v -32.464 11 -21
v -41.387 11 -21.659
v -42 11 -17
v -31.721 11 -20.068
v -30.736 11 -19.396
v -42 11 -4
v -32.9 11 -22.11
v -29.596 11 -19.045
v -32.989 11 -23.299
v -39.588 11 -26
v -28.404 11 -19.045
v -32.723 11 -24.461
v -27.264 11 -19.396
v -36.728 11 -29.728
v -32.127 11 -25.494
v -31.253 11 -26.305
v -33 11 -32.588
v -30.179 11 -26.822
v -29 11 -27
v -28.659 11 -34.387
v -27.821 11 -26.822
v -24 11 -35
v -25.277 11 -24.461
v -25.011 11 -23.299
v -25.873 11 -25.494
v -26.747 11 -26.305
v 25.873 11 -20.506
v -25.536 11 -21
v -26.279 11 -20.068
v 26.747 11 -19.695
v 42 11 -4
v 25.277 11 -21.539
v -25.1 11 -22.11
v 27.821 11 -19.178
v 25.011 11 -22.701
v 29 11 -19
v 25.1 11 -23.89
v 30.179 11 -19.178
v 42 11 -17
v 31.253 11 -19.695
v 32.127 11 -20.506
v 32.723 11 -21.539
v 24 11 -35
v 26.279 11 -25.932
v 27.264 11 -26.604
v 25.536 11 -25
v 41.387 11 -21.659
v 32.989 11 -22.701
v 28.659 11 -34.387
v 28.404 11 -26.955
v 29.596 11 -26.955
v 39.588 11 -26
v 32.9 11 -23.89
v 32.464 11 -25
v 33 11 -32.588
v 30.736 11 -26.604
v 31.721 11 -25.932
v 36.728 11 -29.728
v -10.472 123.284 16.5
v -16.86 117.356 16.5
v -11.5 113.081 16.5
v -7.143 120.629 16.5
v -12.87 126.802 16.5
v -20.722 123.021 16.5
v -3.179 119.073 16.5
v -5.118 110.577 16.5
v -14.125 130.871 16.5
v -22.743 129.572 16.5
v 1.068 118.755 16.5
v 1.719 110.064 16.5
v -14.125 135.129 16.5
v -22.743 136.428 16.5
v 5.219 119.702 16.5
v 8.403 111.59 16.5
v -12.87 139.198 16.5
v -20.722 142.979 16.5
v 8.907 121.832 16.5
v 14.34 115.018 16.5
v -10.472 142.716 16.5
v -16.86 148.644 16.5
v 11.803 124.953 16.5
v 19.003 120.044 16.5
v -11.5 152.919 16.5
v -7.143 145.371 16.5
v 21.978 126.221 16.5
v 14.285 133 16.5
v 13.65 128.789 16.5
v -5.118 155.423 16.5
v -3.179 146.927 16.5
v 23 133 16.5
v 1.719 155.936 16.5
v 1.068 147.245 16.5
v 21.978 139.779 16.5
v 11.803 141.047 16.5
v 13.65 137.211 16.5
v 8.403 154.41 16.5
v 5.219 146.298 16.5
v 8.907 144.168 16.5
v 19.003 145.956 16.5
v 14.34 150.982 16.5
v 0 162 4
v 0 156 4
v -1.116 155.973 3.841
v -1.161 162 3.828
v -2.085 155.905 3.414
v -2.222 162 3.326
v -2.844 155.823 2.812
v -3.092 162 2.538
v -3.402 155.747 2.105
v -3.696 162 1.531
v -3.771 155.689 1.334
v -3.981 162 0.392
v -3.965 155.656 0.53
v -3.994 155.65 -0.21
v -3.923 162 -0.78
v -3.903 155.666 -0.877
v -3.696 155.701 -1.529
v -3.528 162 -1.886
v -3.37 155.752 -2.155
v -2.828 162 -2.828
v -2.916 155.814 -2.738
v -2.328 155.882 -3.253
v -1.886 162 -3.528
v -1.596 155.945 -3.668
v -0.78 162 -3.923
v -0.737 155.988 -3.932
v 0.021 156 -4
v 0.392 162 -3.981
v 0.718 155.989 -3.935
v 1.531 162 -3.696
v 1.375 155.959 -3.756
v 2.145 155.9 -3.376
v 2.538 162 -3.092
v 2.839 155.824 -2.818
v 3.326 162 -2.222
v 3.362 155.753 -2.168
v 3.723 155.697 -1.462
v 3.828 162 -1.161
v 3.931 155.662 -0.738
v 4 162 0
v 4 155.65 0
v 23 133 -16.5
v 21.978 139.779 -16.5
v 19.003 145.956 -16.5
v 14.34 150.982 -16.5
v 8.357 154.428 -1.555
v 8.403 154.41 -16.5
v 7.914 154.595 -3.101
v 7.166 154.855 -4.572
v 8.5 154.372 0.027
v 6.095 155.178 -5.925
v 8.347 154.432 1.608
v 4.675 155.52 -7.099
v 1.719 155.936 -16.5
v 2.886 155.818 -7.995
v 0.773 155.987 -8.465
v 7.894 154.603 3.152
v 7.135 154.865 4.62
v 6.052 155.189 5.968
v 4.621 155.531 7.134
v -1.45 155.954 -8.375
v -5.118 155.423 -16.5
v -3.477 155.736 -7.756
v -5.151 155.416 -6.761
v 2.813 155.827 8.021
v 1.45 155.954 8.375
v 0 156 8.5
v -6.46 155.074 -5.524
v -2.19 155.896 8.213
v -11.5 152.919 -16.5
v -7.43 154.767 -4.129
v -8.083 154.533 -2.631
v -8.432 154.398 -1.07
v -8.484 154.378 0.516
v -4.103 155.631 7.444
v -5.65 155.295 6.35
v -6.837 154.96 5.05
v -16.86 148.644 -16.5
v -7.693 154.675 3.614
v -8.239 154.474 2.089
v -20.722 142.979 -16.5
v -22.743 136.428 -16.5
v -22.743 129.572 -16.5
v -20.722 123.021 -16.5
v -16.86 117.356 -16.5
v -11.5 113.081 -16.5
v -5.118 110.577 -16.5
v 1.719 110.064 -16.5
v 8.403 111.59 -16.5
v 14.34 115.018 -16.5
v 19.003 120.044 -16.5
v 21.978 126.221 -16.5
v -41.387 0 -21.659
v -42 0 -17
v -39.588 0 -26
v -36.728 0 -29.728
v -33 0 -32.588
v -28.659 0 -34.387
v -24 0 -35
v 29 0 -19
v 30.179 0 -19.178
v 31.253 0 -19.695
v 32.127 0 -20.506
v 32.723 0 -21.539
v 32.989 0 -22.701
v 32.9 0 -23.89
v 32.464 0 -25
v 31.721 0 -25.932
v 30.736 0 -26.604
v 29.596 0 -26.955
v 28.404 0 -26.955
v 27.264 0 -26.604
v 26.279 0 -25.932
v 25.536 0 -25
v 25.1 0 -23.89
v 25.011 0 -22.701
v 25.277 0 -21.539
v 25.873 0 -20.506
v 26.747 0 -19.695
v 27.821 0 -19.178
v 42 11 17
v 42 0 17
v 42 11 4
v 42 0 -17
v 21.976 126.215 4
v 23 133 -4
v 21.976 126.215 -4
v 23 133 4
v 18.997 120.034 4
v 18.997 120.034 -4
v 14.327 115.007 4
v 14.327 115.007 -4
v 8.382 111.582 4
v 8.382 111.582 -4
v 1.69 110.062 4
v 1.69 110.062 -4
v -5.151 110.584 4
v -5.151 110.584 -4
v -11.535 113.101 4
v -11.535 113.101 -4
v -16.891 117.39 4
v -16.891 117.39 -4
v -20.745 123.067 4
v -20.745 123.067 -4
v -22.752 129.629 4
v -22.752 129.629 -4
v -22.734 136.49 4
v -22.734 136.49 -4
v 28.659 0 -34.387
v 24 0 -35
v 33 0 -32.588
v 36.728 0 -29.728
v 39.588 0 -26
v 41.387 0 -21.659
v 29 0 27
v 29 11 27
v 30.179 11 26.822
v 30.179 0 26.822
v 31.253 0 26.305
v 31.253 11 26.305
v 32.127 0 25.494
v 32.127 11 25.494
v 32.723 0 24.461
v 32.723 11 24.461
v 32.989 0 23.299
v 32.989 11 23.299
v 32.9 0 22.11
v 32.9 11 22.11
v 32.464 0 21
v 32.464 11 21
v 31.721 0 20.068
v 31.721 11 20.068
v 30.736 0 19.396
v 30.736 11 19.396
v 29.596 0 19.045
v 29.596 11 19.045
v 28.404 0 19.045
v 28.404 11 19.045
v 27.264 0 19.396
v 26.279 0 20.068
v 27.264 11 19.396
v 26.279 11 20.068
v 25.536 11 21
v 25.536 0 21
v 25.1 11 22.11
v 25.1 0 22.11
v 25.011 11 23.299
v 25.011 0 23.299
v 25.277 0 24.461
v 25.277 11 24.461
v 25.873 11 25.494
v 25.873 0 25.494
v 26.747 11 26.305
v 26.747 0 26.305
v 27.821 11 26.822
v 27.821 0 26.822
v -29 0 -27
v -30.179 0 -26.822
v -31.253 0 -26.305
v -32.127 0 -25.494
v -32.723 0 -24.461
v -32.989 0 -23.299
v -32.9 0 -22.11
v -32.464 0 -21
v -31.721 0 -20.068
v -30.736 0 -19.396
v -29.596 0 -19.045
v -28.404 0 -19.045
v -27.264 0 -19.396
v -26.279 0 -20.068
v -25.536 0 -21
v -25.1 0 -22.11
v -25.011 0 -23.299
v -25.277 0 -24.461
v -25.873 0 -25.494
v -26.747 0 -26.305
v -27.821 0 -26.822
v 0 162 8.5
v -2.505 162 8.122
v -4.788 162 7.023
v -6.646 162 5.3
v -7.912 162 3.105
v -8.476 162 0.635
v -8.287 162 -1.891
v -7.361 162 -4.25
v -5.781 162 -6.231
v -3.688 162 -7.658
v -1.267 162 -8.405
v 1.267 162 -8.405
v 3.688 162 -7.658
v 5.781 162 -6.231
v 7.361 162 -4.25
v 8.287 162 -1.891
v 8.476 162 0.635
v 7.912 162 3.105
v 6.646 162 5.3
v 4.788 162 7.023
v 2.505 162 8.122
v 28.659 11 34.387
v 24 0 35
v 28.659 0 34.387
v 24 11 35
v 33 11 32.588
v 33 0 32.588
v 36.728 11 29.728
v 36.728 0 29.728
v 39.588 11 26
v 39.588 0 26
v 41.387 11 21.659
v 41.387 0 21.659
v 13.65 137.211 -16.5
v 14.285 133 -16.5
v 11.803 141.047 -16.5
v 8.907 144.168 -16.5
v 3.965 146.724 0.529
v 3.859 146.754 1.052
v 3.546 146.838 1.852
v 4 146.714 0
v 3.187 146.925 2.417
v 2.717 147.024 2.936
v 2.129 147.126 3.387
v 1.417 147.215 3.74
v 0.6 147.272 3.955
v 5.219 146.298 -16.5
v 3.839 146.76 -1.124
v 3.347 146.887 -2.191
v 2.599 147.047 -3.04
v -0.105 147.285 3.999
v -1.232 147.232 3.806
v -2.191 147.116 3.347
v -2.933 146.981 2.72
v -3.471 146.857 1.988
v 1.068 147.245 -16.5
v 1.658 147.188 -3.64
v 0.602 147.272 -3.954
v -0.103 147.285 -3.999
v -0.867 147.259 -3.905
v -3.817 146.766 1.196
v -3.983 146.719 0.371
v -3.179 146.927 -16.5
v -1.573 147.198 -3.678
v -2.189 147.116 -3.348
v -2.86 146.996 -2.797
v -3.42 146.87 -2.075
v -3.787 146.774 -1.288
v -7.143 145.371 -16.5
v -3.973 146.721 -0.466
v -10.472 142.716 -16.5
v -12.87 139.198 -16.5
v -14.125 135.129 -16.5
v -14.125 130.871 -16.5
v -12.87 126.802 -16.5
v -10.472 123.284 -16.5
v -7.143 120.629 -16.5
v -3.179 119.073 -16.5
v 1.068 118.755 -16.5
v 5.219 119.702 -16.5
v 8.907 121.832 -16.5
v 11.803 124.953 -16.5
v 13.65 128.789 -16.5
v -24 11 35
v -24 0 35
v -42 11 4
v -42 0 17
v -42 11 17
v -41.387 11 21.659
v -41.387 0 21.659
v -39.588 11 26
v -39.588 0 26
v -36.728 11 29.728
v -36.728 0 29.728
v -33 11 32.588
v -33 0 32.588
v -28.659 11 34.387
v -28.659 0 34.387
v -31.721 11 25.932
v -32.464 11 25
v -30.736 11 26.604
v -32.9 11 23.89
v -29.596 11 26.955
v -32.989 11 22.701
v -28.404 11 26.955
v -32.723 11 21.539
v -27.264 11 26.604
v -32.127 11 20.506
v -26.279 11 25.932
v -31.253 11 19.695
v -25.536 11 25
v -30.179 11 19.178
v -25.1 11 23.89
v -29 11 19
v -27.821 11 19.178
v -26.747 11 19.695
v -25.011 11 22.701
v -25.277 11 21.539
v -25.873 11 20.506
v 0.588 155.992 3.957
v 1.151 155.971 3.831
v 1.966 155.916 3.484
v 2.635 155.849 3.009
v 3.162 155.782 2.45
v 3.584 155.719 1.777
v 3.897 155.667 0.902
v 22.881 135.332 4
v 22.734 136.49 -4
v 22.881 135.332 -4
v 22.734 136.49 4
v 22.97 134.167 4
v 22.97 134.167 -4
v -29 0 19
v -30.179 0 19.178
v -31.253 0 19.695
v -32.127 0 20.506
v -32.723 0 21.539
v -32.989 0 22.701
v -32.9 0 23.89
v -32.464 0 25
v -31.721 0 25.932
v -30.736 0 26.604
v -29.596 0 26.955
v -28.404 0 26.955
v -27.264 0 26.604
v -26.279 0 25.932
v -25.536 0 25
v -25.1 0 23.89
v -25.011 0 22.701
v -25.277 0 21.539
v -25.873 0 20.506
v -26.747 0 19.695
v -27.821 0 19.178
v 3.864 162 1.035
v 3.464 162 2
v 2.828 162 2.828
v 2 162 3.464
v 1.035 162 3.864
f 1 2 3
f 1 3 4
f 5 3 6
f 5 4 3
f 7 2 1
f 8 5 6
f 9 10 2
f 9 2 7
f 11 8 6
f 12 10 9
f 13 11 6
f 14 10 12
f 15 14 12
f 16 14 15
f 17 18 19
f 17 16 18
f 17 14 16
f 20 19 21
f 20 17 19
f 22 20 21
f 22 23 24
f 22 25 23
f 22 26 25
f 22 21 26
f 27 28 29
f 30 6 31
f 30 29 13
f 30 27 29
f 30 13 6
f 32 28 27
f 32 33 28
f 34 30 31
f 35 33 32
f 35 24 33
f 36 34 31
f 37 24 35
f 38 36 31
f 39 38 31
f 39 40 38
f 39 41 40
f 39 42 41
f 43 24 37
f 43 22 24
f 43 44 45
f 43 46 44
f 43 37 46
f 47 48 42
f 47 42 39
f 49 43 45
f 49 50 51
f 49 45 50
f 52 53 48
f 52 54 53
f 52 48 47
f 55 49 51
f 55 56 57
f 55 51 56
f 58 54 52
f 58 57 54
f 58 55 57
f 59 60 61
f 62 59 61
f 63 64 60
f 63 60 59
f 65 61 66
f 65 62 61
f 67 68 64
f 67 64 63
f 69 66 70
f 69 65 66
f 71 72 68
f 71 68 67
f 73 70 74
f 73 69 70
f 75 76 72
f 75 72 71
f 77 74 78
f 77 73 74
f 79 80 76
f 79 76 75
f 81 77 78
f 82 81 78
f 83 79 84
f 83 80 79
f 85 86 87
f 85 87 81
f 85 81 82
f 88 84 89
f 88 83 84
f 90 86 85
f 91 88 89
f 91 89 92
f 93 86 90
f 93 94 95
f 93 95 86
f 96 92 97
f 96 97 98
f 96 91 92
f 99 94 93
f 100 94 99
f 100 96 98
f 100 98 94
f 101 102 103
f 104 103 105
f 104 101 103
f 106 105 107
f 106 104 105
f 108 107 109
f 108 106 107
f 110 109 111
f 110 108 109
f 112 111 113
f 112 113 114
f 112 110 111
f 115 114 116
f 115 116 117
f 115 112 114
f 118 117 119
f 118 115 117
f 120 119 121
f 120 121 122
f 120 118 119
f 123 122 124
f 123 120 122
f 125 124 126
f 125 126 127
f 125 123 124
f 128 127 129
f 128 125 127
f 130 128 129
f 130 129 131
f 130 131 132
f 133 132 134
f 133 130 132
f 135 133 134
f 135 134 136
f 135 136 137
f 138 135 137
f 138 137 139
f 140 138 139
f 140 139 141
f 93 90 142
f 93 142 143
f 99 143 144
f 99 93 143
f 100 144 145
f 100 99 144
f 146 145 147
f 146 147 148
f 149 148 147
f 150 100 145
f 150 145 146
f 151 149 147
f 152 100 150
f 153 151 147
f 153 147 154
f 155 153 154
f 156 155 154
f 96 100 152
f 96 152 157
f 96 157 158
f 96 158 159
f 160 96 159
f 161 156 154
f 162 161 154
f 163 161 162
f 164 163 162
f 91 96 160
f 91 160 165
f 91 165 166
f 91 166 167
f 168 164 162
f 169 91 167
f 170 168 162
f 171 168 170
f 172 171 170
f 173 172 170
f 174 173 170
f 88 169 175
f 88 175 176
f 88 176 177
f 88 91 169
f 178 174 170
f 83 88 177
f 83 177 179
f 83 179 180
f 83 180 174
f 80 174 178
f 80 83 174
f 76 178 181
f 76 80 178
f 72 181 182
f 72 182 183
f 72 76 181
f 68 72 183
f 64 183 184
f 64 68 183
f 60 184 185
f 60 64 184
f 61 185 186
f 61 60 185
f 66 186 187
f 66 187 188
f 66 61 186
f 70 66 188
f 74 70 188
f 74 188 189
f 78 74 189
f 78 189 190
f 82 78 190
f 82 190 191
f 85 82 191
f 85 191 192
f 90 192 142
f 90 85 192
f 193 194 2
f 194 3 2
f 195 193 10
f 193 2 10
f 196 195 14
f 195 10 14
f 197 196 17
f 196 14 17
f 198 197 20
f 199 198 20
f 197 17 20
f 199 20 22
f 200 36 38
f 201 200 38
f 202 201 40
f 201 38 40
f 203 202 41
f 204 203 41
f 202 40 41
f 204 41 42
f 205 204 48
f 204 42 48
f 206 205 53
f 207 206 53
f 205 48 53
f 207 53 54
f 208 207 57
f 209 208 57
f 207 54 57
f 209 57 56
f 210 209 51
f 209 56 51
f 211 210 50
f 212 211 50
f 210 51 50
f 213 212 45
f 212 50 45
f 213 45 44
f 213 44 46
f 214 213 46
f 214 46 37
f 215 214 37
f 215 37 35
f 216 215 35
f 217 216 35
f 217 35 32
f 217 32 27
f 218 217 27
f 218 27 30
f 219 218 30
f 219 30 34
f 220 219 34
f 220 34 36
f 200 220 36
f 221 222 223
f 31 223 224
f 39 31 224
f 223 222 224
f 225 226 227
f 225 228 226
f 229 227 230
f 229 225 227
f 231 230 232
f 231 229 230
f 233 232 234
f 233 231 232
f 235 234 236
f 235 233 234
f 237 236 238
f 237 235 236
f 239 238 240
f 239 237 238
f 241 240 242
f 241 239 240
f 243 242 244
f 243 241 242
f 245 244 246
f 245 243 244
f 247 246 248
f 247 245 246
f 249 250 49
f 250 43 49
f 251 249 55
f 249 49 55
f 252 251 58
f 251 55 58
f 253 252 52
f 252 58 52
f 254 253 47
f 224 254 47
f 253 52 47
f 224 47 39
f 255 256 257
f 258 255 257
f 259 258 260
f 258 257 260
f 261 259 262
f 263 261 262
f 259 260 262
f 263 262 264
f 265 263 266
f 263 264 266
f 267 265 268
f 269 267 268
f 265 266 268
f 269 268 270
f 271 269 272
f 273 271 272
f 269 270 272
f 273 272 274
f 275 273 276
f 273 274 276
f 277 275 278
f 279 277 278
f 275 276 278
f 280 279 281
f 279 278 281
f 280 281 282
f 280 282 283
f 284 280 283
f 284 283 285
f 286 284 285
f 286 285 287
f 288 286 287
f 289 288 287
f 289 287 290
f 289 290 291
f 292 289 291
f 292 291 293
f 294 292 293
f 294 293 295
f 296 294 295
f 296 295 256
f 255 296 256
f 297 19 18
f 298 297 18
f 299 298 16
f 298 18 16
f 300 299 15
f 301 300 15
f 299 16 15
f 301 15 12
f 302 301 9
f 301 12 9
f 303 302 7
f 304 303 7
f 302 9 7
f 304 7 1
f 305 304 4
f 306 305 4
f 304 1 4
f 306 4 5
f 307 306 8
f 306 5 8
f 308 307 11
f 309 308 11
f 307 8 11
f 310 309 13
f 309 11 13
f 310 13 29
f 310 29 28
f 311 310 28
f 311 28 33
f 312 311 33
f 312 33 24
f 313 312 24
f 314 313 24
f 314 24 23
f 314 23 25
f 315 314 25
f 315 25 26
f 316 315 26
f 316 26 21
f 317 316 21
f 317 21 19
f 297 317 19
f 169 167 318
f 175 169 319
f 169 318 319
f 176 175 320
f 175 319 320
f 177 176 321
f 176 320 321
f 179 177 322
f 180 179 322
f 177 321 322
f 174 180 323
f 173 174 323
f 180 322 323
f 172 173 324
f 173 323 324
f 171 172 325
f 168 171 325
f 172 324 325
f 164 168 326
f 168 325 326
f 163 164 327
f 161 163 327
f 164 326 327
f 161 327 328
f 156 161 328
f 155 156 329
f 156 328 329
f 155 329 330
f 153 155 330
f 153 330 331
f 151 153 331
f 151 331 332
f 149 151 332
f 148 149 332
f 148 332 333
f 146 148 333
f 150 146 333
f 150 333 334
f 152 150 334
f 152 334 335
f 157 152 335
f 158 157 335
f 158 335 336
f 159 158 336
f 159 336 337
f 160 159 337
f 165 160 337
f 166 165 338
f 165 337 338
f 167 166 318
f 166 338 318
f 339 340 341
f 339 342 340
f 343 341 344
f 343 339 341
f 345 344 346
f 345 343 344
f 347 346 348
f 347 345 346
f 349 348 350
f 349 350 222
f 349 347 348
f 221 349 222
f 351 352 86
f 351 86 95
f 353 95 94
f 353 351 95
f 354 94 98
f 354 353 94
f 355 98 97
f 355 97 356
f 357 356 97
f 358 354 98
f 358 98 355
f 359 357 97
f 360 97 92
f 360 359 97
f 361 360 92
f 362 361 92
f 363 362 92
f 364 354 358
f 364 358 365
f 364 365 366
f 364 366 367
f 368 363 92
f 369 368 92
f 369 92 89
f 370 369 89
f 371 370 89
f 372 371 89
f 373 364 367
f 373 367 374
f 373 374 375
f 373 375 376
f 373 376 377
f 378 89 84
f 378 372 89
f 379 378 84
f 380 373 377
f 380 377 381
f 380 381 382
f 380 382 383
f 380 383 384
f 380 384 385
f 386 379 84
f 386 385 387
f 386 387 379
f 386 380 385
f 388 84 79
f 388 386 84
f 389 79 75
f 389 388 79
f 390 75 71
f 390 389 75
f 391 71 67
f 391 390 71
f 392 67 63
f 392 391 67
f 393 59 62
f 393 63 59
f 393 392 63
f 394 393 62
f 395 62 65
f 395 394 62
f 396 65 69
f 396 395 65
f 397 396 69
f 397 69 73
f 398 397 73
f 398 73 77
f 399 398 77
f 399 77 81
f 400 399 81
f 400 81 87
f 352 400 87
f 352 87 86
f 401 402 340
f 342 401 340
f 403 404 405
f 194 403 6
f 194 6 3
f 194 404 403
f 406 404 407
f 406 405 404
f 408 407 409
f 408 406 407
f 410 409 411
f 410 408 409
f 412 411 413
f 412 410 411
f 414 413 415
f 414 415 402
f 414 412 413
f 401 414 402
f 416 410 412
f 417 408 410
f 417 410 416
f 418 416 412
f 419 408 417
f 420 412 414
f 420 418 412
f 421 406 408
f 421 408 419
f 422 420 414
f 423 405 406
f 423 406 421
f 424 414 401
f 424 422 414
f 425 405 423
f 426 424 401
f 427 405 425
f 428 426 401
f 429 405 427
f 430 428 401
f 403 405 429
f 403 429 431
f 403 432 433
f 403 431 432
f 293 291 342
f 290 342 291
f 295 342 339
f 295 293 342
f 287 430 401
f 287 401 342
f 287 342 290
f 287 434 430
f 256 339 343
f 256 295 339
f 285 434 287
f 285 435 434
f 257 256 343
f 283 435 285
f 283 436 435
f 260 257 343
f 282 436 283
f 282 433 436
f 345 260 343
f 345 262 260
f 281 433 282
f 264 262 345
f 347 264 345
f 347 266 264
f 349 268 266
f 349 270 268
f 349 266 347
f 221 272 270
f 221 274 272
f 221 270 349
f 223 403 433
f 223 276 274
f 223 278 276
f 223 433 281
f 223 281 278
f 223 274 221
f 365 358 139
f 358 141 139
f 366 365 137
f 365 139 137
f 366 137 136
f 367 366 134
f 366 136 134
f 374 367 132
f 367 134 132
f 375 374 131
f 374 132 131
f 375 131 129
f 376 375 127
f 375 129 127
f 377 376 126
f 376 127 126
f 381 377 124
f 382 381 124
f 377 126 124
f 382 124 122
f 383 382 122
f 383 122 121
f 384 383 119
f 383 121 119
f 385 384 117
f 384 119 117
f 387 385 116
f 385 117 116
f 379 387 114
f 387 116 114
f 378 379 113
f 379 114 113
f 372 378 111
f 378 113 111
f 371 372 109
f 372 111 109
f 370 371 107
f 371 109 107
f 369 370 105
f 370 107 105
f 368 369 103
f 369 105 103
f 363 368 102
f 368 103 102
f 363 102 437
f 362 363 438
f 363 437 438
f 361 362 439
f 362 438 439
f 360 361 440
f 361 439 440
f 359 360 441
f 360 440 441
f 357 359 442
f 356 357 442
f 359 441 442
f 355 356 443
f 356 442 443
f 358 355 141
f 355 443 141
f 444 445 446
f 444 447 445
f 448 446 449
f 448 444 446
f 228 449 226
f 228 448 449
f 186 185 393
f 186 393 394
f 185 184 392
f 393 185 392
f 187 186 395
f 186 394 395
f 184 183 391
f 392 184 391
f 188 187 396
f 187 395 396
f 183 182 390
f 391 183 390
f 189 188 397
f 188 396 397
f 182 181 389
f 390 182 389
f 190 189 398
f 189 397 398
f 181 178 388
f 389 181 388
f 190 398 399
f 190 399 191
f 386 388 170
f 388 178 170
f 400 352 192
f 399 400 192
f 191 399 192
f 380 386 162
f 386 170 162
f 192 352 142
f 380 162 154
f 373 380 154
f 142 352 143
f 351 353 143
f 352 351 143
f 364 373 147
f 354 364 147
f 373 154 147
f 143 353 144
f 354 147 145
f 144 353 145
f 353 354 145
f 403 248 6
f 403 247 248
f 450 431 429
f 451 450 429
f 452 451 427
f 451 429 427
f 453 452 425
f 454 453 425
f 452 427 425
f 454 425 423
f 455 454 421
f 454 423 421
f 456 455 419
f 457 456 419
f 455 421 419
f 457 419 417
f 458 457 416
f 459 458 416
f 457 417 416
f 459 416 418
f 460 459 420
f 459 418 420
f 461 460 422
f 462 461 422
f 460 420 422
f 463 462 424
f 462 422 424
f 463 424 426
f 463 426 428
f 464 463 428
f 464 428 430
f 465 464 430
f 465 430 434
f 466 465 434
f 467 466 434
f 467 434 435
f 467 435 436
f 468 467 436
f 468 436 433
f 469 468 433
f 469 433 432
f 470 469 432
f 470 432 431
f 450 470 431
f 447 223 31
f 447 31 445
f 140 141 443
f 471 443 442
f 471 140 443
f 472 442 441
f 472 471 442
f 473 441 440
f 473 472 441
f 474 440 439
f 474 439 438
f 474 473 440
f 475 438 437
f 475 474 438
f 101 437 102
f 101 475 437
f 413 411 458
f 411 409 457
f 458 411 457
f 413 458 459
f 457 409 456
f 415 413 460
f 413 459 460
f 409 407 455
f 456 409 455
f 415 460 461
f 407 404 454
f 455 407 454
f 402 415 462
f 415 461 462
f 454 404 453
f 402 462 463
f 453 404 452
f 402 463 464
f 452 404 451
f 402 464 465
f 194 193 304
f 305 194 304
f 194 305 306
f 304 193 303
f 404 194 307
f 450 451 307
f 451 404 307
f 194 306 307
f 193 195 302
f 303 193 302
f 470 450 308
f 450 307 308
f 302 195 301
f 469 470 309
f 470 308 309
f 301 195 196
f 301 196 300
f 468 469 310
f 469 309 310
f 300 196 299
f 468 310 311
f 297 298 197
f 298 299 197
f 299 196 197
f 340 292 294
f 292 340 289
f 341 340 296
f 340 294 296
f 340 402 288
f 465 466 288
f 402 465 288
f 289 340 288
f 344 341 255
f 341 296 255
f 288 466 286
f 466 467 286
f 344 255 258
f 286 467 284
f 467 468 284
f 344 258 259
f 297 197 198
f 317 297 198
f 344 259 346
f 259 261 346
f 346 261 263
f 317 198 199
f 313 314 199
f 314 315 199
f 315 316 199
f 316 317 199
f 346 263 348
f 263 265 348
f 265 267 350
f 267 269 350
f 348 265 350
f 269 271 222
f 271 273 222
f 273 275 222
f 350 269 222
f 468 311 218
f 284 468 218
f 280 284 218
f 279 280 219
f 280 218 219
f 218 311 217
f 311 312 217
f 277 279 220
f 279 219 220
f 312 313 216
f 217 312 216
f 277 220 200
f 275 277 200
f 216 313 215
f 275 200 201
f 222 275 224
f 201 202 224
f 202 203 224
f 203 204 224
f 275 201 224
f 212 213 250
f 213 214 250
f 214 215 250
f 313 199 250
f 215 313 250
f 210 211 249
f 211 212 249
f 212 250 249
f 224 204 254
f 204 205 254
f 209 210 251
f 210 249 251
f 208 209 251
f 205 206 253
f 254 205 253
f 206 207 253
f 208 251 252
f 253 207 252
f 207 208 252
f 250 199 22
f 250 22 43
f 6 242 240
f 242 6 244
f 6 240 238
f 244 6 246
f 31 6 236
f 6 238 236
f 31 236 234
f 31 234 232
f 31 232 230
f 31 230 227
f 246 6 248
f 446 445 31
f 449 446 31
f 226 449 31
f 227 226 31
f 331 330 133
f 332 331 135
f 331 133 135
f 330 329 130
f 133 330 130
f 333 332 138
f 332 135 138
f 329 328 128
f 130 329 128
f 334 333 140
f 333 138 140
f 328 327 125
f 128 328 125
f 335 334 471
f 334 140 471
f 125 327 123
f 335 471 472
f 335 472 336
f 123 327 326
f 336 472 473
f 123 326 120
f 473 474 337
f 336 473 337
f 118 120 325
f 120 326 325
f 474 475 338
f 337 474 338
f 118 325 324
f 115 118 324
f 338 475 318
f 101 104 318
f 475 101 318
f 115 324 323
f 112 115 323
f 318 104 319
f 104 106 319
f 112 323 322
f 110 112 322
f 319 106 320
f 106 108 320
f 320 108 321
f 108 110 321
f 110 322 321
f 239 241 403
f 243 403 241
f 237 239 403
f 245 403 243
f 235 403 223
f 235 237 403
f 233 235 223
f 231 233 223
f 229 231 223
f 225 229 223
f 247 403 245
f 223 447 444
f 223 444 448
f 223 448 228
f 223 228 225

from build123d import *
from build123d.topology import SkipClean

# Parameters (mm, degrees)
SKETCH1_W                = 84
SKETCH1_H                = 70
BOSS_EXTRUDE1_DEPTH      = 11
SKETCH2_R                = 4
CUT_EXTRUDE1_DEPTH       = 56.767373974
FILLET1_R                = 18
BOSS_EXTRUDE2_DEPTH      = 4
SKETCH3_3_R              = 23
SKETCH3_3_R_2            = 14.285
BOSS_EXTRUDE3_DEPTH      = 16.5
CUT_EXTRUDE2_DEPTH       = 166.302752548
CUT_EXTRUDE2_DEPTH_BACK  = 166.302752548
SKETCH3_4_R              = 14.285
BOSS_EXTRUDE4_REACH      = 172.977
BOSS_EXTRUDE4_END_RADIUS = 23
SKETCH5_R                = 8.5
SKETCH5_R_2              = 4
CUT_EXTRUDE4_OUTLINE_W   = 4
CUT_EXTRUDE4_OUTLINE_H   = 15.28653943


# Read off the part's stored shape, not the designer's step: Cut-Extrude4
with BuildPart() as part:
    # Sketch1 → Boss-Extrude1 (new body)
    with BuildSketch(Plane(origin=(0, 0, 0), x_dir=(1, 0, 0), z_dir=(0, 1, 0))):
        Rectangle(SKETCH1_W, SKETCH1_H)
    extrude(amount=BOSS_EXTRUDE1_DEPTH)

    # Sketch2 → Cut-Extrude1 (cut, through all)
    with BuildSketch(Plane(origin=(0, 11, 0), x_dir=(1, 0, 0), z_dir=(0, 1, 0))):
        with Locations(Location((29, 23, 0), (0, 0, 270))):
            Circle(SKETCH2_R)
        with Locations(Location((29, -23, 0), (0, 0, 270))):
            Circle(SKETCH2_R)
        with Locations(Location((-29, -23, 0), (0, 0, 90))):
            Circle(SKETCH2_R)
        with Locations(Location((-29, 23, 0), (0, 0, 90))):
            Circle(SKETCH2_R)
    extrude(amount=-CUT_EXTRUDE1_DEPTH, mode=Mode.SUBTRACT)

    # Fillet1
    fillet1_edges = [part.edges().sort_by_distance(p)[0] for p in [
        (42, 5.5, 35),
        (-42, 5.5, 35),
        (-42, 5.5, -35),
        (42, 5.5, -35),
    ]]
    fillet(fillet1_edges, radius=FILLET1_R)

    # Sketch3 → Boss-Extrude2 (add, symmetric)
    with BuildSketch(Plane.XY):
        with BuildLine():
            Line((-22.733632294, 136.490266855), (-42, 11))
            Line((-42, 11), (-24, 11))
            Line((-24, 11), (24, 11))
            Line((24, 11), (42, 11))
            Line((42, 11), (22.733632294, 136.490266855))
            ThreePointArc((22.733632294, 136.490266855), (22.933311392, 134.750208164), (23, 133))
            ThreePointArc((23, 133), (-1.750208164, 110.066688608), (-22.733632294, 136.490266855))
        make_face()
    extrude(amount=BOSS_EXTRUDE2_DEPTH, both=True)


with BuildPart() as body_2:
    # Sketch3<3> → Boss-Extrude3 (new, symmetric)
    # profile 1 of 2: a face of its own
    with BuildSketch(Plane.XY):
        with Locations((0, 133)):
            Circle(SKETCH3_3_R)
        with Locations((0, 133)):
            Circle(SKETCH3_3_R_2, mode=Mode.SUBTRACT)
    # profile 2 of 2: a face of its own
    with BuildSketch(Plane.XY):
        with Locations((0, 133)):
            Circle(SKETCH3_3_R_2)
    extrude(amount=BOSS_EXTRUDE3_DEPTH, both=True)

    # Sketch3<4> → Cut-Extrude2 (cut, two sides: drawn at the far end of the back side and taken through both)
    with BuildSketch(Plane.XY.offset(-CUT_EXTRUDE2_DEPTH_BACK)):
        with Locations((0, 133)):
            Circle(SKETCH3_4_R)
    extrude(amount=CUT_EXTRUDE2_DEPTH + CUT_EXTRUDE2_DEPTH_BACK, mode=Mode.SUBTRACT)

    # Boss-Extrude4: up to this cylinder (the profile starts outside it)
    boss_extrude4_end = Plane(origin=(0, 133, -8.259584), z_dir=(0, 0, -1)) * Cylinder(BOSS_EXTRUDE4_END_RADIUS, 392.954, mode=Mode.PRIVATE)
    # Sketch5 → Boss-Extrude4 (add, up to the surface)
    with BuildSketch(Plane(origin=(0, 162, 0), x_dir=(-1, 0, 0), z_dir=(0, -1, 0)), mode=Mode.PRIVATE) as boss_extrude4_sk1:
        with Locations(Location((0, 0, 0), (0, 0, 270))):
            Circle(SKETCH5_R)
        with Locations(Location((0, 0, 0), (0, 0, 270))):
            Circle(SKETCH5_R_2, mode=Mode.SUBTRACT)
    boss_extrude4_tool1 = extrude(boss_extrude4_sk1.sketch, amount=BOSS_EXTRUDE4_REACH, mode=Mode.PRIVATE) - boss_extrude4_end
    add(boss_extrude4_tool1.solids().sort_by_distance((0, 162, -8.259584))[0])

    # Cut-Extrude4 outline → Cut-Extrude4 (revolve, cut)
    with SkipClean():  # the faces are left unmerged after this step: merging them gives an invalid solid
        with BuildSketch(Plane.XY):
            with Locations((2, 154.356730285)):
                Rectangle(CUT_EXTRUDE4_OUTLINE_W, CUT_EXTRUDE4_OUTLINE_H)
        revolve(axis=Axis((0, 0, 0), (0, 1, 0)), mode=Mode.SUBTRACT)


solid = Compound([part.part, body_2.part])
